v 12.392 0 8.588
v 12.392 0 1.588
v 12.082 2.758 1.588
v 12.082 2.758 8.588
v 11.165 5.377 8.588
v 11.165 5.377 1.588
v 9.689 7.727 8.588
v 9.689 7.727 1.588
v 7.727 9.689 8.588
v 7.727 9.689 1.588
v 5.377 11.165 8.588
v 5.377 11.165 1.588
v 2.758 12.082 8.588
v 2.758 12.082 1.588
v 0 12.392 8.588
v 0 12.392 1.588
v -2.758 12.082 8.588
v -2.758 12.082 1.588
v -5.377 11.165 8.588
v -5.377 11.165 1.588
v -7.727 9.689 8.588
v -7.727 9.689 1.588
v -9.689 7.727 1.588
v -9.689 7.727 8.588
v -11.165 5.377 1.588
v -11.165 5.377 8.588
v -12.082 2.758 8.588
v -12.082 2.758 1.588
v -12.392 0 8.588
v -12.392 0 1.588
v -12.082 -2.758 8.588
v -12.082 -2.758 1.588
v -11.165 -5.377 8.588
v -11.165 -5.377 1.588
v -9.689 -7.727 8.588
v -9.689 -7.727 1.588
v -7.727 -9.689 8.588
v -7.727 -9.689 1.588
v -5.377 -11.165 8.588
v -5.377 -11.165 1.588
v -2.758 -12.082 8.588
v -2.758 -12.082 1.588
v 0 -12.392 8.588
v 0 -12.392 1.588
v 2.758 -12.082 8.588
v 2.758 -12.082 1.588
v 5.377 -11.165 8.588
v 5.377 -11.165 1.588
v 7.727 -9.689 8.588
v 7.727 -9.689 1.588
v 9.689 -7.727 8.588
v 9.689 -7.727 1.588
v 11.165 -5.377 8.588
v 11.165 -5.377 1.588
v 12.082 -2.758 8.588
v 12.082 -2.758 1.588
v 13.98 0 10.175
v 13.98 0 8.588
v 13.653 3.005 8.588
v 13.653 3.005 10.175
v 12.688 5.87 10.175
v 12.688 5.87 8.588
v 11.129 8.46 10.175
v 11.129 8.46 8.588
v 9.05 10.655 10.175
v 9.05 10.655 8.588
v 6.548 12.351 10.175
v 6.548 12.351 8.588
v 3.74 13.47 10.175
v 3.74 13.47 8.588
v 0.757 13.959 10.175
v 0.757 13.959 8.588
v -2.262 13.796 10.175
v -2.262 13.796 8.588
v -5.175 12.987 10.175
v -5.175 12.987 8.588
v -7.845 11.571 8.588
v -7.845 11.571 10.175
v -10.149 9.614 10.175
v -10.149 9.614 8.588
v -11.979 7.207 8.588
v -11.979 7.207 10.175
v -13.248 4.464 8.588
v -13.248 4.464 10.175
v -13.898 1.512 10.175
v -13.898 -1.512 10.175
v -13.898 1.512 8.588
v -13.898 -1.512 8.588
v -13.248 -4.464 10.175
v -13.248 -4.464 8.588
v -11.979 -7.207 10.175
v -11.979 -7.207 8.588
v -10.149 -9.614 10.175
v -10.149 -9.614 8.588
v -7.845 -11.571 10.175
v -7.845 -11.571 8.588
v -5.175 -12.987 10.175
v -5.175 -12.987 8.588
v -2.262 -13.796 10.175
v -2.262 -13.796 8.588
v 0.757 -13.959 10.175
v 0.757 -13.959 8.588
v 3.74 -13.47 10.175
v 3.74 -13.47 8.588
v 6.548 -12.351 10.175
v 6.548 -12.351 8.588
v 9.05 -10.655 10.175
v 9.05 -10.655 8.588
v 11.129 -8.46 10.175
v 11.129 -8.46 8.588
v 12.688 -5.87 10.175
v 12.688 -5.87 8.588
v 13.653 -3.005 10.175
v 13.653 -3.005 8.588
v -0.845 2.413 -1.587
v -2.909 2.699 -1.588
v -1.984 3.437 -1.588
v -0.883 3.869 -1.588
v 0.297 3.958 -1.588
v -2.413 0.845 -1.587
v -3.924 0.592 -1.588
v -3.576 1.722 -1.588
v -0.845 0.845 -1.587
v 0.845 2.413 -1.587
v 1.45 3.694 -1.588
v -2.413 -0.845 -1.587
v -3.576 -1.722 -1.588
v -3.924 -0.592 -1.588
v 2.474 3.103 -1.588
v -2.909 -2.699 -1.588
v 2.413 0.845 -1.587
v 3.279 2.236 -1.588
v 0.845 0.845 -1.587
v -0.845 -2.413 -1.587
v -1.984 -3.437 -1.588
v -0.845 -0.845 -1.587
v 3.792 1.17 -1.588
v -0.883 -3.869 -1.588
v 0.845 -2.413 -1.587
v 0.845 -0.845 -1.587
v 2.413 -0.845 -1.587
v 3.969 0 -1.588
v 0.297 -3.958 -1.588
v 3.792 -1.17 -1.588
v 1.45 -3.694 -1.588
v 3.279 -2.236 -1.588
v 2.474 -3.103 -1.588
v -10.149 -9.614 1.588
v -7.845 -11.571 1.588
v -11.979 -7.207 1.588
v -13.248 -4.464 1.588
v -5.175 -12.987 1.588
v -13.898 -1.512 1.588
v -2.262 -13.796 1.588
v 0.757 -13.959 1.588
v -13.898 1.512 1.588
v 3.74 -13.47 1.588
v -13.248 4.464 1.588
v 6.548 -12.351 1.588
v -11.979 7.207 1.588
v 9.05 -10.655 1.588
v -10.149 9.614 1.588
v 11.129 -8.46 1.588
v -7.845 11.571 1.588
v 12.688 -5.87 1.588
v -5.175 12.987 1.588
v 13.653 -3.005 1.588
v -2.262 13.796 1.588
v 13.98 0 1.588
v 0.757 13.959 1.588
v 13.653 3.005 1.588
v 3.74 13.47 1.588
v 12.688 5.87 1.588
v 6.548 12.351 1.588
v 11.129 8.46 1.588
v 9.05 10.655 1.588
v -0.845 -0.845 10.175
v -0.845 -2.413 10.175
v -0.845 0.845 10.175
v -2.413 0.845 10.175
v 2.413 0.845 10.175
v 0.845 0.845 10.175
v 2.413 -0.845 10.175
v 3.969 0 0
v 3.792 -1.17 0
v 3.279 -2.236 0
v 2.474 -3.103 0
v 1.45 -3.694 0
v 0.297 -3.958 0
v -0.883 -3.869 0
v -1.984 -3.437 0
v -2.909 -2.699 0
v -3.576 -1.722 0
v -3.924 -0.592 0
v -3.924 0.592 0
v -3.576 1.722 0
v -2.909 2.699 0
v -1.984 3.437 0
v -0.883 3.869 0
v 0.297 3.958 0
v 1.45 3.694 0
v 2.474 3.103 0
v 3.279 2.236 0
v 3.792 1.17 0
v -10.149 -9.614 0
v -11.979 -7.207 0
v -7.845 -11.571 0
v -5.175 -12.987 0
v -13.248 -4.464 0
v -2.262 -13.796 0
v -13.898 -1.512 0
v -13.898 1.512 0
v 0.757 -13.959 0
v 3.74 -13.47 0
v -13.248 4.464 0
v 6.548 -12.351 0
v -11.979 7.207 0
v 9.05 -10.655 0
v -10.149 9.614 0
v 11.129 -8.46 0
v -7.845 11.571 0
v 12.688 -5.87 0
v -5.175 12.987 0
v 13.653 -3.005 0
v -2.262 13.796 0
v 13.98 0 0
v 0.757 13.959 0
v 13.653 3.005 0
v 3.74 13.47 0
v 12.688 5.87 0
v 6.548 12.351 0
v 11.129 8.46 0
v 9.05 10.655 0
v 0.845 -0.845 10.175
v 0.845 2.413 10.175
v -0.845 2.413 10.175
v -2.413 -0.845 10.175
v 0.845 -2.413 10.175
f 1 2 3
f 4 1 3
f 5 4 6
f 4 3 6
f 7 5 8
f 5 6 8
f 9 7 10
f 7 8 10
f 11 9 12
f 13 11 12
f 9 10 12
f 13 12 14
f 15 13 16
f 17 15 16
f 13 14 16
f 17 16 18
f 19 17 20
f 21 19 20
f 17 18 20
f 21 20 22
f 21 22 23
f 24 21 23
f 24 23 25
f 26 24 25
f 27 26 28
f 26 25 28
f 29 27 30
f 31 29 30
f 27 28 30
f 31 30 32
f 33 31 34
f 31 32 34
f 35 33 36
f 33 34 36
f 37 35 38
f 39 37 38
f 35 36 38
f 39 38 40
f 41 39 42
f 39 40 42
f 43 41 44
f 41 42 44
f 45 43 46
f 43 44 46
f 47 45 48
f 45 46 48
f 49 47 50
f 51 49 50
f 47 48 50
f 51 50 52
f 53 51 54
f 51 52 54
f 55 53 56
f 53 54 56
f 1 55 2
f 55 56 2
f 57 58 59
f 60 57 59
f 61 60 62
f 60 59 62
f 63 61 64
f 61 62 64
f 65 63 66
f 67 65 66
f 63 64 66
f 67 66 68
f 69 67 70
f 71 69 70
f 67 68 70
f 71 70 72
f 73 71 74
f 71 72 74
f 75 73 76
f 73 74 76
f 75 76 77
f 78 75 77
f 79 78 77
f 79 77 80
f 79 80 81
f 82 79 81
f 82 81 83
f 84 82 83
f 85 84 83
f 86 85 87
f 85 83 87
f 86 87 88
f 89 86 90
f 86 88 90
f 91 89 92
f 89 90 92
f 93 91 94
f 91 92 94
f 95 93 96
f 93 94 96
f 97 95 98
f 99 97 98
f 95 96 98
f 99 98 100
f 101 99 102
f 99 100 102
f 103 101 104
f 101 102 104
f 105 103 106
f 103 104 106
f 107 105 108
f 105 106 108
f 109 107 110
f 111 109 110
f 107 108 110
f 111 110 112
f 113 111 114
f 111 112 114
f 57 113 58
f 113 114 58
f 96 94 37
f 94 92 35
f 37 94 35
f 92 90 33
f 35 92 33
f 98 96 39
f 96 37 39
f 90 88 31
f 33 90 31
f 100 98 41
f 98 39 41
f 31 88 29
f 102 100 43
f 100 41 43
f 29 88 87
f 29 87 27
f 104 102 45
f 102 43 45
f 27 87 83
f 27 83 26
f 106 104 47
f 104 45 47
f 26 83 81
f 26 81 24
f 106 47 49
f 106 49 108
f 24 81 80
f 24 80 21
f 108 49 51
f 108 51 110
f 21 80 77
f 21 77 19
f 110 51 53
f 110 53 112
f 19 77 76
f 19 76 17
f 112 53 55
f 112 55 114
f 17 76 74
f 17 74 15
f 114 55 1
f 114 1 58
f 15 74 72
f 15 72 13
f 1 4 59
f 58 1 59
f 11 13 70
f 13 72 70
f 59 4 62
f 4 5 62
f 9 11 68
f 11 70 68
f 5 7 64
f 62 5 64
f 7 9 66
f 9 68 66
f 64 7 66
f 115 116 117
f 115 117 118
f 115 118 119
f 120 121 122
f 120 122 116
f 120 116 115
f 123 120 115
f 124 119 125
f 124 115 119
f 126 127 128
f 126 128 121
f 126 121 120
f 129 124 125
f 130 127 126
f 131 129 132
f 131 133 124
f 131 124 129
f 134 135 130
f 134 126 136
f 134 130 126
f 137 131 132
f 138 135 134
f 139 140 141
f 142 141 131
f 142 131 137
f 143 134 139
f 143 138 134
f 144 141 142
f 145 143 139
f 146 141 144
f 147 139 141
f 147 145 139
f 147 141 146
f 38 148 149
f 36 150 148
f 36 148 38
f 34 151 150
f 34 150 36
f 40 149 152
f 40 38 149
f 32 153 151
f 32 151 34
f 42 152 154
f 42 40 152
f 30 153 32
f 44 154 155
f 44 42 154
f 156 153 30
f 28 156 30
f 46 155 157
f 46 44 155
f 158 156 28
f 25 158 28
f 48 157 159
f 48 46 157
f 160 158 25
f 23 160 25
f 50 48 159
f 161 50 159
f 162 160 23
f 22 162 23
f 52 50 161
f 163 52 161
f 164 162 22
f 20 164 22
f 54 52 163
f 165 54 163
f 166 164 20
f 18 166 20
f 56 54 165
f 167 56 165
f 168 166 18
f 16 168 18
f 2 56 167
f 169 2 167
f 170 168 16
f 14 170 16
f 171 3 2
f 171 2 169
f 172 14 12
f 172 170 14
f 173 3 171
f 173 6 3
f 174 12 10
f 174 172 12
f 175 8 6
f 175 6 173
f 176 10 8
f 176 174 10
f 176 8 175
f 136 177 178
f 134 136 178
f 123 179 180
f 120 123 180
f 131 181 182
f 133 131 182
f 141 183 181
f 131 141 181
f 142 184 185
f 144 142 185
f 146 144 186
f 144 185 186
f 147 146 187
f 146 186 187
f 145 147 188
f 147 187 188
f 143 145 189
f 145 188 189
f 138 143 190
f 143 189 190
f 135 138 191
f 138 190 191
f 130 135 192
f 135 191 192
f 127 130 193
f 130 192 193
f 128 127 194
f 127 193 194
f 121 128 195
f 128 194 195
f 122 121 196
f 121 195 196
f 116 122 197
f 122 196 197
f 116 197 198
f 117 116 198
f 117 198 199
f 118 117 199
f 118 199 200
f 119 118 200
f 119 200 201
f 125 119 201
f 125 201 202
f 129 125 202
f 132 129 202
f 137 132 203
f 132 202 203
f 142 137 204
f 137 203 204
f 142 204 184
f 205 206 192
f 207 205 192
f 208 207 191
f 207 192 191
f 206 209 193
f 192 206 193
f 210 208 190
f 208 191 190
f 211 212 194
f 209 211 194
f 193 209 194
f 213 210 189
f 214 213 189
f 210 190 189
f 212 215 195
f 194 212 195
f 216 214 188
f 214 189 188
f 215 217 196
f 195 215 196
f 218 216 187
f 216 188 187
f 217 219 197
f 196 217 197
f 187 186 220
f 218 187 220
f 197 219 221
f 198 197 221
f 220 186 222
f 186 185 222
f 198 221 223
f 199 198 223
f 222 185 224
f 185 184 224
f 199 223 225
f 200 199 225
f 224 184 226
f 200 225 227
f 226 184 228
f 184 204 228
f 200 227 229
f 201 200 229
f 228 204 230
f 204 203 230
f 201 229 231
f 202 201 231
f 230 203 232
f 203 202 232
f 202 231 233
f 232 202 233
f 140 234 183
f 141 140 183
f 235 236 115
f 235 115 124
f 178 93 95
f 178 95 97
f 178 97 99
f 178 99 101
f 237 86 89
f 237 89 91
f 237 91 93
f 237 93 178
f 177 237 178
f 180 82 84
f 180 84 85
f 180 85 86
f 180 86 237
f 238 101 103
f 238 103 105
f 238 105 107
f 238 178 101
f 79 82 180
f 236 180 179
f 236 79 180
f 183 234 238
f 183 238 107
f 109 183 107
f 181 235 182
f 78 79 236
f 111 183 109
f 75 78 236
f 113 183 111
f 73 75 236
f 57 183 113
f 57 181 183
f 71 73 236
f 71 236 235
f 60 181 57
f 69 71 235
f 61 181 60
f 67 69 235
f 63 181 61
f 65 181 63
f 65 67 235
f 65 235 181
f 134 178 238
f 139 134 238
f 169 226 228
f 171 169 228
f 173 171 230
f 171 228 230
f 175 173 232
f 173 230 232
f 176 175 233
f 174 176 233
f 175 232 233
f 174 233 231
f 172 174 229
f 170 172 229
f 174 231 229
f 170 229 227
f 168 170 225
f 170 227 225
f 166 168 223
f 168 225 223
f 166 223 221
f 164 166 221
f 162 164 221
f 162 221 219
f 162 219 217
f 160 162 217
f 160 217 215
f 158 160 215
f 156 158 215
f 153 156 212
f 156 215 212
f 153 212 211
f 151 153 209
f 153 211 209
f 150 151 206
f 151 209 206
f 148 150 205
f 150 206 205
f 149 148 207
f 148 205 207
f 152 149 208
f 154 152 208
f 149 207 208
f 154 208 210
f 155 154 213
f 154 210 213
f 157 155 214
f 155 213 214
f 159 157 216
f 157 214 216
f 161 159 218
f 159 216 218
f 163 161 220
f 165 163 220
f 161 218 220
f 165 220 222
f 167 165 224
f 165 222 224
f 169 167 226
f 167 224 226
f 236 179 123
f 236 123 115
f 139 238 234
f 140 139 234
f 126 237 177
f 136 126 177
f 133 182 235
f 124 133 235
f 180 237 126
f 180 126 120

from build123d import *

# Parameters (mm, degrees)
F0_R     = 13.97999998
F1_DEPTH = 1.5875
F2_R     = 12.39249998
F3_DEPTH = 7
F4_R     = 13.97999998
F5_DEPTH = 1.5875
F6_R     = 3.96875
F7_DEPTH = 1.5875
F8_W     = 1.56845
F8_H     = 1.6891
F8_W_2   = 1.6891
F8_H_2   = 1.56845
F9_DEPTH = 11.7625


with BuildPart() as f1:
    # F0 (on Top) → F1 (new body)
    with BuildSketch(Plane.XY):
        Circle(F0_R)
    extrude(amount=F1_DEPTH)

    # F2 (on face) → F3 (join)
    with BuildSketch(Plane.XY.offset(1.5875)):
        Circle(F2_R)
    extrude(amount=F3_DEPTH)

    # F4 (on face) → F5 (join)
    with BuildSketch(Plane.XY.offset(8.5875)):
        Circle(F4_R)
    extrude(amount=F5_DEPTH)

    # F6 (on face) → F7 (join)
    with BuildSketch(Plane(origin=(0, 0, 0), x_dir=(1, 0, 0), z_dir=(0, 0, -1))):
        Circle(F6_R)
    extrude(amount=F7_DEPTH)

    # F8 (on face) → F9 (cut, through all)
    with BuildSketch(Plane.XY.offset(10.175)):
        with Locations((1.628775, 0)):
            Rectangle(F8_W, F8_H)
        with Locations((0, -1.628775)):
            Rectangle(F8_W_2, F8_H_2)
        Rectangle(F8_W_2, F8_H)
        with Locations((-1.628775, 0)):
            Rectangle(F8_W, F8_H)
        with Locations((0, 1.628775)):
            Rectangle(F8_W_2, F8_H_2)
    extrude(amount=-F9_DEPTH, mode=Mode.SUBTRACT)


solid = f1.part
